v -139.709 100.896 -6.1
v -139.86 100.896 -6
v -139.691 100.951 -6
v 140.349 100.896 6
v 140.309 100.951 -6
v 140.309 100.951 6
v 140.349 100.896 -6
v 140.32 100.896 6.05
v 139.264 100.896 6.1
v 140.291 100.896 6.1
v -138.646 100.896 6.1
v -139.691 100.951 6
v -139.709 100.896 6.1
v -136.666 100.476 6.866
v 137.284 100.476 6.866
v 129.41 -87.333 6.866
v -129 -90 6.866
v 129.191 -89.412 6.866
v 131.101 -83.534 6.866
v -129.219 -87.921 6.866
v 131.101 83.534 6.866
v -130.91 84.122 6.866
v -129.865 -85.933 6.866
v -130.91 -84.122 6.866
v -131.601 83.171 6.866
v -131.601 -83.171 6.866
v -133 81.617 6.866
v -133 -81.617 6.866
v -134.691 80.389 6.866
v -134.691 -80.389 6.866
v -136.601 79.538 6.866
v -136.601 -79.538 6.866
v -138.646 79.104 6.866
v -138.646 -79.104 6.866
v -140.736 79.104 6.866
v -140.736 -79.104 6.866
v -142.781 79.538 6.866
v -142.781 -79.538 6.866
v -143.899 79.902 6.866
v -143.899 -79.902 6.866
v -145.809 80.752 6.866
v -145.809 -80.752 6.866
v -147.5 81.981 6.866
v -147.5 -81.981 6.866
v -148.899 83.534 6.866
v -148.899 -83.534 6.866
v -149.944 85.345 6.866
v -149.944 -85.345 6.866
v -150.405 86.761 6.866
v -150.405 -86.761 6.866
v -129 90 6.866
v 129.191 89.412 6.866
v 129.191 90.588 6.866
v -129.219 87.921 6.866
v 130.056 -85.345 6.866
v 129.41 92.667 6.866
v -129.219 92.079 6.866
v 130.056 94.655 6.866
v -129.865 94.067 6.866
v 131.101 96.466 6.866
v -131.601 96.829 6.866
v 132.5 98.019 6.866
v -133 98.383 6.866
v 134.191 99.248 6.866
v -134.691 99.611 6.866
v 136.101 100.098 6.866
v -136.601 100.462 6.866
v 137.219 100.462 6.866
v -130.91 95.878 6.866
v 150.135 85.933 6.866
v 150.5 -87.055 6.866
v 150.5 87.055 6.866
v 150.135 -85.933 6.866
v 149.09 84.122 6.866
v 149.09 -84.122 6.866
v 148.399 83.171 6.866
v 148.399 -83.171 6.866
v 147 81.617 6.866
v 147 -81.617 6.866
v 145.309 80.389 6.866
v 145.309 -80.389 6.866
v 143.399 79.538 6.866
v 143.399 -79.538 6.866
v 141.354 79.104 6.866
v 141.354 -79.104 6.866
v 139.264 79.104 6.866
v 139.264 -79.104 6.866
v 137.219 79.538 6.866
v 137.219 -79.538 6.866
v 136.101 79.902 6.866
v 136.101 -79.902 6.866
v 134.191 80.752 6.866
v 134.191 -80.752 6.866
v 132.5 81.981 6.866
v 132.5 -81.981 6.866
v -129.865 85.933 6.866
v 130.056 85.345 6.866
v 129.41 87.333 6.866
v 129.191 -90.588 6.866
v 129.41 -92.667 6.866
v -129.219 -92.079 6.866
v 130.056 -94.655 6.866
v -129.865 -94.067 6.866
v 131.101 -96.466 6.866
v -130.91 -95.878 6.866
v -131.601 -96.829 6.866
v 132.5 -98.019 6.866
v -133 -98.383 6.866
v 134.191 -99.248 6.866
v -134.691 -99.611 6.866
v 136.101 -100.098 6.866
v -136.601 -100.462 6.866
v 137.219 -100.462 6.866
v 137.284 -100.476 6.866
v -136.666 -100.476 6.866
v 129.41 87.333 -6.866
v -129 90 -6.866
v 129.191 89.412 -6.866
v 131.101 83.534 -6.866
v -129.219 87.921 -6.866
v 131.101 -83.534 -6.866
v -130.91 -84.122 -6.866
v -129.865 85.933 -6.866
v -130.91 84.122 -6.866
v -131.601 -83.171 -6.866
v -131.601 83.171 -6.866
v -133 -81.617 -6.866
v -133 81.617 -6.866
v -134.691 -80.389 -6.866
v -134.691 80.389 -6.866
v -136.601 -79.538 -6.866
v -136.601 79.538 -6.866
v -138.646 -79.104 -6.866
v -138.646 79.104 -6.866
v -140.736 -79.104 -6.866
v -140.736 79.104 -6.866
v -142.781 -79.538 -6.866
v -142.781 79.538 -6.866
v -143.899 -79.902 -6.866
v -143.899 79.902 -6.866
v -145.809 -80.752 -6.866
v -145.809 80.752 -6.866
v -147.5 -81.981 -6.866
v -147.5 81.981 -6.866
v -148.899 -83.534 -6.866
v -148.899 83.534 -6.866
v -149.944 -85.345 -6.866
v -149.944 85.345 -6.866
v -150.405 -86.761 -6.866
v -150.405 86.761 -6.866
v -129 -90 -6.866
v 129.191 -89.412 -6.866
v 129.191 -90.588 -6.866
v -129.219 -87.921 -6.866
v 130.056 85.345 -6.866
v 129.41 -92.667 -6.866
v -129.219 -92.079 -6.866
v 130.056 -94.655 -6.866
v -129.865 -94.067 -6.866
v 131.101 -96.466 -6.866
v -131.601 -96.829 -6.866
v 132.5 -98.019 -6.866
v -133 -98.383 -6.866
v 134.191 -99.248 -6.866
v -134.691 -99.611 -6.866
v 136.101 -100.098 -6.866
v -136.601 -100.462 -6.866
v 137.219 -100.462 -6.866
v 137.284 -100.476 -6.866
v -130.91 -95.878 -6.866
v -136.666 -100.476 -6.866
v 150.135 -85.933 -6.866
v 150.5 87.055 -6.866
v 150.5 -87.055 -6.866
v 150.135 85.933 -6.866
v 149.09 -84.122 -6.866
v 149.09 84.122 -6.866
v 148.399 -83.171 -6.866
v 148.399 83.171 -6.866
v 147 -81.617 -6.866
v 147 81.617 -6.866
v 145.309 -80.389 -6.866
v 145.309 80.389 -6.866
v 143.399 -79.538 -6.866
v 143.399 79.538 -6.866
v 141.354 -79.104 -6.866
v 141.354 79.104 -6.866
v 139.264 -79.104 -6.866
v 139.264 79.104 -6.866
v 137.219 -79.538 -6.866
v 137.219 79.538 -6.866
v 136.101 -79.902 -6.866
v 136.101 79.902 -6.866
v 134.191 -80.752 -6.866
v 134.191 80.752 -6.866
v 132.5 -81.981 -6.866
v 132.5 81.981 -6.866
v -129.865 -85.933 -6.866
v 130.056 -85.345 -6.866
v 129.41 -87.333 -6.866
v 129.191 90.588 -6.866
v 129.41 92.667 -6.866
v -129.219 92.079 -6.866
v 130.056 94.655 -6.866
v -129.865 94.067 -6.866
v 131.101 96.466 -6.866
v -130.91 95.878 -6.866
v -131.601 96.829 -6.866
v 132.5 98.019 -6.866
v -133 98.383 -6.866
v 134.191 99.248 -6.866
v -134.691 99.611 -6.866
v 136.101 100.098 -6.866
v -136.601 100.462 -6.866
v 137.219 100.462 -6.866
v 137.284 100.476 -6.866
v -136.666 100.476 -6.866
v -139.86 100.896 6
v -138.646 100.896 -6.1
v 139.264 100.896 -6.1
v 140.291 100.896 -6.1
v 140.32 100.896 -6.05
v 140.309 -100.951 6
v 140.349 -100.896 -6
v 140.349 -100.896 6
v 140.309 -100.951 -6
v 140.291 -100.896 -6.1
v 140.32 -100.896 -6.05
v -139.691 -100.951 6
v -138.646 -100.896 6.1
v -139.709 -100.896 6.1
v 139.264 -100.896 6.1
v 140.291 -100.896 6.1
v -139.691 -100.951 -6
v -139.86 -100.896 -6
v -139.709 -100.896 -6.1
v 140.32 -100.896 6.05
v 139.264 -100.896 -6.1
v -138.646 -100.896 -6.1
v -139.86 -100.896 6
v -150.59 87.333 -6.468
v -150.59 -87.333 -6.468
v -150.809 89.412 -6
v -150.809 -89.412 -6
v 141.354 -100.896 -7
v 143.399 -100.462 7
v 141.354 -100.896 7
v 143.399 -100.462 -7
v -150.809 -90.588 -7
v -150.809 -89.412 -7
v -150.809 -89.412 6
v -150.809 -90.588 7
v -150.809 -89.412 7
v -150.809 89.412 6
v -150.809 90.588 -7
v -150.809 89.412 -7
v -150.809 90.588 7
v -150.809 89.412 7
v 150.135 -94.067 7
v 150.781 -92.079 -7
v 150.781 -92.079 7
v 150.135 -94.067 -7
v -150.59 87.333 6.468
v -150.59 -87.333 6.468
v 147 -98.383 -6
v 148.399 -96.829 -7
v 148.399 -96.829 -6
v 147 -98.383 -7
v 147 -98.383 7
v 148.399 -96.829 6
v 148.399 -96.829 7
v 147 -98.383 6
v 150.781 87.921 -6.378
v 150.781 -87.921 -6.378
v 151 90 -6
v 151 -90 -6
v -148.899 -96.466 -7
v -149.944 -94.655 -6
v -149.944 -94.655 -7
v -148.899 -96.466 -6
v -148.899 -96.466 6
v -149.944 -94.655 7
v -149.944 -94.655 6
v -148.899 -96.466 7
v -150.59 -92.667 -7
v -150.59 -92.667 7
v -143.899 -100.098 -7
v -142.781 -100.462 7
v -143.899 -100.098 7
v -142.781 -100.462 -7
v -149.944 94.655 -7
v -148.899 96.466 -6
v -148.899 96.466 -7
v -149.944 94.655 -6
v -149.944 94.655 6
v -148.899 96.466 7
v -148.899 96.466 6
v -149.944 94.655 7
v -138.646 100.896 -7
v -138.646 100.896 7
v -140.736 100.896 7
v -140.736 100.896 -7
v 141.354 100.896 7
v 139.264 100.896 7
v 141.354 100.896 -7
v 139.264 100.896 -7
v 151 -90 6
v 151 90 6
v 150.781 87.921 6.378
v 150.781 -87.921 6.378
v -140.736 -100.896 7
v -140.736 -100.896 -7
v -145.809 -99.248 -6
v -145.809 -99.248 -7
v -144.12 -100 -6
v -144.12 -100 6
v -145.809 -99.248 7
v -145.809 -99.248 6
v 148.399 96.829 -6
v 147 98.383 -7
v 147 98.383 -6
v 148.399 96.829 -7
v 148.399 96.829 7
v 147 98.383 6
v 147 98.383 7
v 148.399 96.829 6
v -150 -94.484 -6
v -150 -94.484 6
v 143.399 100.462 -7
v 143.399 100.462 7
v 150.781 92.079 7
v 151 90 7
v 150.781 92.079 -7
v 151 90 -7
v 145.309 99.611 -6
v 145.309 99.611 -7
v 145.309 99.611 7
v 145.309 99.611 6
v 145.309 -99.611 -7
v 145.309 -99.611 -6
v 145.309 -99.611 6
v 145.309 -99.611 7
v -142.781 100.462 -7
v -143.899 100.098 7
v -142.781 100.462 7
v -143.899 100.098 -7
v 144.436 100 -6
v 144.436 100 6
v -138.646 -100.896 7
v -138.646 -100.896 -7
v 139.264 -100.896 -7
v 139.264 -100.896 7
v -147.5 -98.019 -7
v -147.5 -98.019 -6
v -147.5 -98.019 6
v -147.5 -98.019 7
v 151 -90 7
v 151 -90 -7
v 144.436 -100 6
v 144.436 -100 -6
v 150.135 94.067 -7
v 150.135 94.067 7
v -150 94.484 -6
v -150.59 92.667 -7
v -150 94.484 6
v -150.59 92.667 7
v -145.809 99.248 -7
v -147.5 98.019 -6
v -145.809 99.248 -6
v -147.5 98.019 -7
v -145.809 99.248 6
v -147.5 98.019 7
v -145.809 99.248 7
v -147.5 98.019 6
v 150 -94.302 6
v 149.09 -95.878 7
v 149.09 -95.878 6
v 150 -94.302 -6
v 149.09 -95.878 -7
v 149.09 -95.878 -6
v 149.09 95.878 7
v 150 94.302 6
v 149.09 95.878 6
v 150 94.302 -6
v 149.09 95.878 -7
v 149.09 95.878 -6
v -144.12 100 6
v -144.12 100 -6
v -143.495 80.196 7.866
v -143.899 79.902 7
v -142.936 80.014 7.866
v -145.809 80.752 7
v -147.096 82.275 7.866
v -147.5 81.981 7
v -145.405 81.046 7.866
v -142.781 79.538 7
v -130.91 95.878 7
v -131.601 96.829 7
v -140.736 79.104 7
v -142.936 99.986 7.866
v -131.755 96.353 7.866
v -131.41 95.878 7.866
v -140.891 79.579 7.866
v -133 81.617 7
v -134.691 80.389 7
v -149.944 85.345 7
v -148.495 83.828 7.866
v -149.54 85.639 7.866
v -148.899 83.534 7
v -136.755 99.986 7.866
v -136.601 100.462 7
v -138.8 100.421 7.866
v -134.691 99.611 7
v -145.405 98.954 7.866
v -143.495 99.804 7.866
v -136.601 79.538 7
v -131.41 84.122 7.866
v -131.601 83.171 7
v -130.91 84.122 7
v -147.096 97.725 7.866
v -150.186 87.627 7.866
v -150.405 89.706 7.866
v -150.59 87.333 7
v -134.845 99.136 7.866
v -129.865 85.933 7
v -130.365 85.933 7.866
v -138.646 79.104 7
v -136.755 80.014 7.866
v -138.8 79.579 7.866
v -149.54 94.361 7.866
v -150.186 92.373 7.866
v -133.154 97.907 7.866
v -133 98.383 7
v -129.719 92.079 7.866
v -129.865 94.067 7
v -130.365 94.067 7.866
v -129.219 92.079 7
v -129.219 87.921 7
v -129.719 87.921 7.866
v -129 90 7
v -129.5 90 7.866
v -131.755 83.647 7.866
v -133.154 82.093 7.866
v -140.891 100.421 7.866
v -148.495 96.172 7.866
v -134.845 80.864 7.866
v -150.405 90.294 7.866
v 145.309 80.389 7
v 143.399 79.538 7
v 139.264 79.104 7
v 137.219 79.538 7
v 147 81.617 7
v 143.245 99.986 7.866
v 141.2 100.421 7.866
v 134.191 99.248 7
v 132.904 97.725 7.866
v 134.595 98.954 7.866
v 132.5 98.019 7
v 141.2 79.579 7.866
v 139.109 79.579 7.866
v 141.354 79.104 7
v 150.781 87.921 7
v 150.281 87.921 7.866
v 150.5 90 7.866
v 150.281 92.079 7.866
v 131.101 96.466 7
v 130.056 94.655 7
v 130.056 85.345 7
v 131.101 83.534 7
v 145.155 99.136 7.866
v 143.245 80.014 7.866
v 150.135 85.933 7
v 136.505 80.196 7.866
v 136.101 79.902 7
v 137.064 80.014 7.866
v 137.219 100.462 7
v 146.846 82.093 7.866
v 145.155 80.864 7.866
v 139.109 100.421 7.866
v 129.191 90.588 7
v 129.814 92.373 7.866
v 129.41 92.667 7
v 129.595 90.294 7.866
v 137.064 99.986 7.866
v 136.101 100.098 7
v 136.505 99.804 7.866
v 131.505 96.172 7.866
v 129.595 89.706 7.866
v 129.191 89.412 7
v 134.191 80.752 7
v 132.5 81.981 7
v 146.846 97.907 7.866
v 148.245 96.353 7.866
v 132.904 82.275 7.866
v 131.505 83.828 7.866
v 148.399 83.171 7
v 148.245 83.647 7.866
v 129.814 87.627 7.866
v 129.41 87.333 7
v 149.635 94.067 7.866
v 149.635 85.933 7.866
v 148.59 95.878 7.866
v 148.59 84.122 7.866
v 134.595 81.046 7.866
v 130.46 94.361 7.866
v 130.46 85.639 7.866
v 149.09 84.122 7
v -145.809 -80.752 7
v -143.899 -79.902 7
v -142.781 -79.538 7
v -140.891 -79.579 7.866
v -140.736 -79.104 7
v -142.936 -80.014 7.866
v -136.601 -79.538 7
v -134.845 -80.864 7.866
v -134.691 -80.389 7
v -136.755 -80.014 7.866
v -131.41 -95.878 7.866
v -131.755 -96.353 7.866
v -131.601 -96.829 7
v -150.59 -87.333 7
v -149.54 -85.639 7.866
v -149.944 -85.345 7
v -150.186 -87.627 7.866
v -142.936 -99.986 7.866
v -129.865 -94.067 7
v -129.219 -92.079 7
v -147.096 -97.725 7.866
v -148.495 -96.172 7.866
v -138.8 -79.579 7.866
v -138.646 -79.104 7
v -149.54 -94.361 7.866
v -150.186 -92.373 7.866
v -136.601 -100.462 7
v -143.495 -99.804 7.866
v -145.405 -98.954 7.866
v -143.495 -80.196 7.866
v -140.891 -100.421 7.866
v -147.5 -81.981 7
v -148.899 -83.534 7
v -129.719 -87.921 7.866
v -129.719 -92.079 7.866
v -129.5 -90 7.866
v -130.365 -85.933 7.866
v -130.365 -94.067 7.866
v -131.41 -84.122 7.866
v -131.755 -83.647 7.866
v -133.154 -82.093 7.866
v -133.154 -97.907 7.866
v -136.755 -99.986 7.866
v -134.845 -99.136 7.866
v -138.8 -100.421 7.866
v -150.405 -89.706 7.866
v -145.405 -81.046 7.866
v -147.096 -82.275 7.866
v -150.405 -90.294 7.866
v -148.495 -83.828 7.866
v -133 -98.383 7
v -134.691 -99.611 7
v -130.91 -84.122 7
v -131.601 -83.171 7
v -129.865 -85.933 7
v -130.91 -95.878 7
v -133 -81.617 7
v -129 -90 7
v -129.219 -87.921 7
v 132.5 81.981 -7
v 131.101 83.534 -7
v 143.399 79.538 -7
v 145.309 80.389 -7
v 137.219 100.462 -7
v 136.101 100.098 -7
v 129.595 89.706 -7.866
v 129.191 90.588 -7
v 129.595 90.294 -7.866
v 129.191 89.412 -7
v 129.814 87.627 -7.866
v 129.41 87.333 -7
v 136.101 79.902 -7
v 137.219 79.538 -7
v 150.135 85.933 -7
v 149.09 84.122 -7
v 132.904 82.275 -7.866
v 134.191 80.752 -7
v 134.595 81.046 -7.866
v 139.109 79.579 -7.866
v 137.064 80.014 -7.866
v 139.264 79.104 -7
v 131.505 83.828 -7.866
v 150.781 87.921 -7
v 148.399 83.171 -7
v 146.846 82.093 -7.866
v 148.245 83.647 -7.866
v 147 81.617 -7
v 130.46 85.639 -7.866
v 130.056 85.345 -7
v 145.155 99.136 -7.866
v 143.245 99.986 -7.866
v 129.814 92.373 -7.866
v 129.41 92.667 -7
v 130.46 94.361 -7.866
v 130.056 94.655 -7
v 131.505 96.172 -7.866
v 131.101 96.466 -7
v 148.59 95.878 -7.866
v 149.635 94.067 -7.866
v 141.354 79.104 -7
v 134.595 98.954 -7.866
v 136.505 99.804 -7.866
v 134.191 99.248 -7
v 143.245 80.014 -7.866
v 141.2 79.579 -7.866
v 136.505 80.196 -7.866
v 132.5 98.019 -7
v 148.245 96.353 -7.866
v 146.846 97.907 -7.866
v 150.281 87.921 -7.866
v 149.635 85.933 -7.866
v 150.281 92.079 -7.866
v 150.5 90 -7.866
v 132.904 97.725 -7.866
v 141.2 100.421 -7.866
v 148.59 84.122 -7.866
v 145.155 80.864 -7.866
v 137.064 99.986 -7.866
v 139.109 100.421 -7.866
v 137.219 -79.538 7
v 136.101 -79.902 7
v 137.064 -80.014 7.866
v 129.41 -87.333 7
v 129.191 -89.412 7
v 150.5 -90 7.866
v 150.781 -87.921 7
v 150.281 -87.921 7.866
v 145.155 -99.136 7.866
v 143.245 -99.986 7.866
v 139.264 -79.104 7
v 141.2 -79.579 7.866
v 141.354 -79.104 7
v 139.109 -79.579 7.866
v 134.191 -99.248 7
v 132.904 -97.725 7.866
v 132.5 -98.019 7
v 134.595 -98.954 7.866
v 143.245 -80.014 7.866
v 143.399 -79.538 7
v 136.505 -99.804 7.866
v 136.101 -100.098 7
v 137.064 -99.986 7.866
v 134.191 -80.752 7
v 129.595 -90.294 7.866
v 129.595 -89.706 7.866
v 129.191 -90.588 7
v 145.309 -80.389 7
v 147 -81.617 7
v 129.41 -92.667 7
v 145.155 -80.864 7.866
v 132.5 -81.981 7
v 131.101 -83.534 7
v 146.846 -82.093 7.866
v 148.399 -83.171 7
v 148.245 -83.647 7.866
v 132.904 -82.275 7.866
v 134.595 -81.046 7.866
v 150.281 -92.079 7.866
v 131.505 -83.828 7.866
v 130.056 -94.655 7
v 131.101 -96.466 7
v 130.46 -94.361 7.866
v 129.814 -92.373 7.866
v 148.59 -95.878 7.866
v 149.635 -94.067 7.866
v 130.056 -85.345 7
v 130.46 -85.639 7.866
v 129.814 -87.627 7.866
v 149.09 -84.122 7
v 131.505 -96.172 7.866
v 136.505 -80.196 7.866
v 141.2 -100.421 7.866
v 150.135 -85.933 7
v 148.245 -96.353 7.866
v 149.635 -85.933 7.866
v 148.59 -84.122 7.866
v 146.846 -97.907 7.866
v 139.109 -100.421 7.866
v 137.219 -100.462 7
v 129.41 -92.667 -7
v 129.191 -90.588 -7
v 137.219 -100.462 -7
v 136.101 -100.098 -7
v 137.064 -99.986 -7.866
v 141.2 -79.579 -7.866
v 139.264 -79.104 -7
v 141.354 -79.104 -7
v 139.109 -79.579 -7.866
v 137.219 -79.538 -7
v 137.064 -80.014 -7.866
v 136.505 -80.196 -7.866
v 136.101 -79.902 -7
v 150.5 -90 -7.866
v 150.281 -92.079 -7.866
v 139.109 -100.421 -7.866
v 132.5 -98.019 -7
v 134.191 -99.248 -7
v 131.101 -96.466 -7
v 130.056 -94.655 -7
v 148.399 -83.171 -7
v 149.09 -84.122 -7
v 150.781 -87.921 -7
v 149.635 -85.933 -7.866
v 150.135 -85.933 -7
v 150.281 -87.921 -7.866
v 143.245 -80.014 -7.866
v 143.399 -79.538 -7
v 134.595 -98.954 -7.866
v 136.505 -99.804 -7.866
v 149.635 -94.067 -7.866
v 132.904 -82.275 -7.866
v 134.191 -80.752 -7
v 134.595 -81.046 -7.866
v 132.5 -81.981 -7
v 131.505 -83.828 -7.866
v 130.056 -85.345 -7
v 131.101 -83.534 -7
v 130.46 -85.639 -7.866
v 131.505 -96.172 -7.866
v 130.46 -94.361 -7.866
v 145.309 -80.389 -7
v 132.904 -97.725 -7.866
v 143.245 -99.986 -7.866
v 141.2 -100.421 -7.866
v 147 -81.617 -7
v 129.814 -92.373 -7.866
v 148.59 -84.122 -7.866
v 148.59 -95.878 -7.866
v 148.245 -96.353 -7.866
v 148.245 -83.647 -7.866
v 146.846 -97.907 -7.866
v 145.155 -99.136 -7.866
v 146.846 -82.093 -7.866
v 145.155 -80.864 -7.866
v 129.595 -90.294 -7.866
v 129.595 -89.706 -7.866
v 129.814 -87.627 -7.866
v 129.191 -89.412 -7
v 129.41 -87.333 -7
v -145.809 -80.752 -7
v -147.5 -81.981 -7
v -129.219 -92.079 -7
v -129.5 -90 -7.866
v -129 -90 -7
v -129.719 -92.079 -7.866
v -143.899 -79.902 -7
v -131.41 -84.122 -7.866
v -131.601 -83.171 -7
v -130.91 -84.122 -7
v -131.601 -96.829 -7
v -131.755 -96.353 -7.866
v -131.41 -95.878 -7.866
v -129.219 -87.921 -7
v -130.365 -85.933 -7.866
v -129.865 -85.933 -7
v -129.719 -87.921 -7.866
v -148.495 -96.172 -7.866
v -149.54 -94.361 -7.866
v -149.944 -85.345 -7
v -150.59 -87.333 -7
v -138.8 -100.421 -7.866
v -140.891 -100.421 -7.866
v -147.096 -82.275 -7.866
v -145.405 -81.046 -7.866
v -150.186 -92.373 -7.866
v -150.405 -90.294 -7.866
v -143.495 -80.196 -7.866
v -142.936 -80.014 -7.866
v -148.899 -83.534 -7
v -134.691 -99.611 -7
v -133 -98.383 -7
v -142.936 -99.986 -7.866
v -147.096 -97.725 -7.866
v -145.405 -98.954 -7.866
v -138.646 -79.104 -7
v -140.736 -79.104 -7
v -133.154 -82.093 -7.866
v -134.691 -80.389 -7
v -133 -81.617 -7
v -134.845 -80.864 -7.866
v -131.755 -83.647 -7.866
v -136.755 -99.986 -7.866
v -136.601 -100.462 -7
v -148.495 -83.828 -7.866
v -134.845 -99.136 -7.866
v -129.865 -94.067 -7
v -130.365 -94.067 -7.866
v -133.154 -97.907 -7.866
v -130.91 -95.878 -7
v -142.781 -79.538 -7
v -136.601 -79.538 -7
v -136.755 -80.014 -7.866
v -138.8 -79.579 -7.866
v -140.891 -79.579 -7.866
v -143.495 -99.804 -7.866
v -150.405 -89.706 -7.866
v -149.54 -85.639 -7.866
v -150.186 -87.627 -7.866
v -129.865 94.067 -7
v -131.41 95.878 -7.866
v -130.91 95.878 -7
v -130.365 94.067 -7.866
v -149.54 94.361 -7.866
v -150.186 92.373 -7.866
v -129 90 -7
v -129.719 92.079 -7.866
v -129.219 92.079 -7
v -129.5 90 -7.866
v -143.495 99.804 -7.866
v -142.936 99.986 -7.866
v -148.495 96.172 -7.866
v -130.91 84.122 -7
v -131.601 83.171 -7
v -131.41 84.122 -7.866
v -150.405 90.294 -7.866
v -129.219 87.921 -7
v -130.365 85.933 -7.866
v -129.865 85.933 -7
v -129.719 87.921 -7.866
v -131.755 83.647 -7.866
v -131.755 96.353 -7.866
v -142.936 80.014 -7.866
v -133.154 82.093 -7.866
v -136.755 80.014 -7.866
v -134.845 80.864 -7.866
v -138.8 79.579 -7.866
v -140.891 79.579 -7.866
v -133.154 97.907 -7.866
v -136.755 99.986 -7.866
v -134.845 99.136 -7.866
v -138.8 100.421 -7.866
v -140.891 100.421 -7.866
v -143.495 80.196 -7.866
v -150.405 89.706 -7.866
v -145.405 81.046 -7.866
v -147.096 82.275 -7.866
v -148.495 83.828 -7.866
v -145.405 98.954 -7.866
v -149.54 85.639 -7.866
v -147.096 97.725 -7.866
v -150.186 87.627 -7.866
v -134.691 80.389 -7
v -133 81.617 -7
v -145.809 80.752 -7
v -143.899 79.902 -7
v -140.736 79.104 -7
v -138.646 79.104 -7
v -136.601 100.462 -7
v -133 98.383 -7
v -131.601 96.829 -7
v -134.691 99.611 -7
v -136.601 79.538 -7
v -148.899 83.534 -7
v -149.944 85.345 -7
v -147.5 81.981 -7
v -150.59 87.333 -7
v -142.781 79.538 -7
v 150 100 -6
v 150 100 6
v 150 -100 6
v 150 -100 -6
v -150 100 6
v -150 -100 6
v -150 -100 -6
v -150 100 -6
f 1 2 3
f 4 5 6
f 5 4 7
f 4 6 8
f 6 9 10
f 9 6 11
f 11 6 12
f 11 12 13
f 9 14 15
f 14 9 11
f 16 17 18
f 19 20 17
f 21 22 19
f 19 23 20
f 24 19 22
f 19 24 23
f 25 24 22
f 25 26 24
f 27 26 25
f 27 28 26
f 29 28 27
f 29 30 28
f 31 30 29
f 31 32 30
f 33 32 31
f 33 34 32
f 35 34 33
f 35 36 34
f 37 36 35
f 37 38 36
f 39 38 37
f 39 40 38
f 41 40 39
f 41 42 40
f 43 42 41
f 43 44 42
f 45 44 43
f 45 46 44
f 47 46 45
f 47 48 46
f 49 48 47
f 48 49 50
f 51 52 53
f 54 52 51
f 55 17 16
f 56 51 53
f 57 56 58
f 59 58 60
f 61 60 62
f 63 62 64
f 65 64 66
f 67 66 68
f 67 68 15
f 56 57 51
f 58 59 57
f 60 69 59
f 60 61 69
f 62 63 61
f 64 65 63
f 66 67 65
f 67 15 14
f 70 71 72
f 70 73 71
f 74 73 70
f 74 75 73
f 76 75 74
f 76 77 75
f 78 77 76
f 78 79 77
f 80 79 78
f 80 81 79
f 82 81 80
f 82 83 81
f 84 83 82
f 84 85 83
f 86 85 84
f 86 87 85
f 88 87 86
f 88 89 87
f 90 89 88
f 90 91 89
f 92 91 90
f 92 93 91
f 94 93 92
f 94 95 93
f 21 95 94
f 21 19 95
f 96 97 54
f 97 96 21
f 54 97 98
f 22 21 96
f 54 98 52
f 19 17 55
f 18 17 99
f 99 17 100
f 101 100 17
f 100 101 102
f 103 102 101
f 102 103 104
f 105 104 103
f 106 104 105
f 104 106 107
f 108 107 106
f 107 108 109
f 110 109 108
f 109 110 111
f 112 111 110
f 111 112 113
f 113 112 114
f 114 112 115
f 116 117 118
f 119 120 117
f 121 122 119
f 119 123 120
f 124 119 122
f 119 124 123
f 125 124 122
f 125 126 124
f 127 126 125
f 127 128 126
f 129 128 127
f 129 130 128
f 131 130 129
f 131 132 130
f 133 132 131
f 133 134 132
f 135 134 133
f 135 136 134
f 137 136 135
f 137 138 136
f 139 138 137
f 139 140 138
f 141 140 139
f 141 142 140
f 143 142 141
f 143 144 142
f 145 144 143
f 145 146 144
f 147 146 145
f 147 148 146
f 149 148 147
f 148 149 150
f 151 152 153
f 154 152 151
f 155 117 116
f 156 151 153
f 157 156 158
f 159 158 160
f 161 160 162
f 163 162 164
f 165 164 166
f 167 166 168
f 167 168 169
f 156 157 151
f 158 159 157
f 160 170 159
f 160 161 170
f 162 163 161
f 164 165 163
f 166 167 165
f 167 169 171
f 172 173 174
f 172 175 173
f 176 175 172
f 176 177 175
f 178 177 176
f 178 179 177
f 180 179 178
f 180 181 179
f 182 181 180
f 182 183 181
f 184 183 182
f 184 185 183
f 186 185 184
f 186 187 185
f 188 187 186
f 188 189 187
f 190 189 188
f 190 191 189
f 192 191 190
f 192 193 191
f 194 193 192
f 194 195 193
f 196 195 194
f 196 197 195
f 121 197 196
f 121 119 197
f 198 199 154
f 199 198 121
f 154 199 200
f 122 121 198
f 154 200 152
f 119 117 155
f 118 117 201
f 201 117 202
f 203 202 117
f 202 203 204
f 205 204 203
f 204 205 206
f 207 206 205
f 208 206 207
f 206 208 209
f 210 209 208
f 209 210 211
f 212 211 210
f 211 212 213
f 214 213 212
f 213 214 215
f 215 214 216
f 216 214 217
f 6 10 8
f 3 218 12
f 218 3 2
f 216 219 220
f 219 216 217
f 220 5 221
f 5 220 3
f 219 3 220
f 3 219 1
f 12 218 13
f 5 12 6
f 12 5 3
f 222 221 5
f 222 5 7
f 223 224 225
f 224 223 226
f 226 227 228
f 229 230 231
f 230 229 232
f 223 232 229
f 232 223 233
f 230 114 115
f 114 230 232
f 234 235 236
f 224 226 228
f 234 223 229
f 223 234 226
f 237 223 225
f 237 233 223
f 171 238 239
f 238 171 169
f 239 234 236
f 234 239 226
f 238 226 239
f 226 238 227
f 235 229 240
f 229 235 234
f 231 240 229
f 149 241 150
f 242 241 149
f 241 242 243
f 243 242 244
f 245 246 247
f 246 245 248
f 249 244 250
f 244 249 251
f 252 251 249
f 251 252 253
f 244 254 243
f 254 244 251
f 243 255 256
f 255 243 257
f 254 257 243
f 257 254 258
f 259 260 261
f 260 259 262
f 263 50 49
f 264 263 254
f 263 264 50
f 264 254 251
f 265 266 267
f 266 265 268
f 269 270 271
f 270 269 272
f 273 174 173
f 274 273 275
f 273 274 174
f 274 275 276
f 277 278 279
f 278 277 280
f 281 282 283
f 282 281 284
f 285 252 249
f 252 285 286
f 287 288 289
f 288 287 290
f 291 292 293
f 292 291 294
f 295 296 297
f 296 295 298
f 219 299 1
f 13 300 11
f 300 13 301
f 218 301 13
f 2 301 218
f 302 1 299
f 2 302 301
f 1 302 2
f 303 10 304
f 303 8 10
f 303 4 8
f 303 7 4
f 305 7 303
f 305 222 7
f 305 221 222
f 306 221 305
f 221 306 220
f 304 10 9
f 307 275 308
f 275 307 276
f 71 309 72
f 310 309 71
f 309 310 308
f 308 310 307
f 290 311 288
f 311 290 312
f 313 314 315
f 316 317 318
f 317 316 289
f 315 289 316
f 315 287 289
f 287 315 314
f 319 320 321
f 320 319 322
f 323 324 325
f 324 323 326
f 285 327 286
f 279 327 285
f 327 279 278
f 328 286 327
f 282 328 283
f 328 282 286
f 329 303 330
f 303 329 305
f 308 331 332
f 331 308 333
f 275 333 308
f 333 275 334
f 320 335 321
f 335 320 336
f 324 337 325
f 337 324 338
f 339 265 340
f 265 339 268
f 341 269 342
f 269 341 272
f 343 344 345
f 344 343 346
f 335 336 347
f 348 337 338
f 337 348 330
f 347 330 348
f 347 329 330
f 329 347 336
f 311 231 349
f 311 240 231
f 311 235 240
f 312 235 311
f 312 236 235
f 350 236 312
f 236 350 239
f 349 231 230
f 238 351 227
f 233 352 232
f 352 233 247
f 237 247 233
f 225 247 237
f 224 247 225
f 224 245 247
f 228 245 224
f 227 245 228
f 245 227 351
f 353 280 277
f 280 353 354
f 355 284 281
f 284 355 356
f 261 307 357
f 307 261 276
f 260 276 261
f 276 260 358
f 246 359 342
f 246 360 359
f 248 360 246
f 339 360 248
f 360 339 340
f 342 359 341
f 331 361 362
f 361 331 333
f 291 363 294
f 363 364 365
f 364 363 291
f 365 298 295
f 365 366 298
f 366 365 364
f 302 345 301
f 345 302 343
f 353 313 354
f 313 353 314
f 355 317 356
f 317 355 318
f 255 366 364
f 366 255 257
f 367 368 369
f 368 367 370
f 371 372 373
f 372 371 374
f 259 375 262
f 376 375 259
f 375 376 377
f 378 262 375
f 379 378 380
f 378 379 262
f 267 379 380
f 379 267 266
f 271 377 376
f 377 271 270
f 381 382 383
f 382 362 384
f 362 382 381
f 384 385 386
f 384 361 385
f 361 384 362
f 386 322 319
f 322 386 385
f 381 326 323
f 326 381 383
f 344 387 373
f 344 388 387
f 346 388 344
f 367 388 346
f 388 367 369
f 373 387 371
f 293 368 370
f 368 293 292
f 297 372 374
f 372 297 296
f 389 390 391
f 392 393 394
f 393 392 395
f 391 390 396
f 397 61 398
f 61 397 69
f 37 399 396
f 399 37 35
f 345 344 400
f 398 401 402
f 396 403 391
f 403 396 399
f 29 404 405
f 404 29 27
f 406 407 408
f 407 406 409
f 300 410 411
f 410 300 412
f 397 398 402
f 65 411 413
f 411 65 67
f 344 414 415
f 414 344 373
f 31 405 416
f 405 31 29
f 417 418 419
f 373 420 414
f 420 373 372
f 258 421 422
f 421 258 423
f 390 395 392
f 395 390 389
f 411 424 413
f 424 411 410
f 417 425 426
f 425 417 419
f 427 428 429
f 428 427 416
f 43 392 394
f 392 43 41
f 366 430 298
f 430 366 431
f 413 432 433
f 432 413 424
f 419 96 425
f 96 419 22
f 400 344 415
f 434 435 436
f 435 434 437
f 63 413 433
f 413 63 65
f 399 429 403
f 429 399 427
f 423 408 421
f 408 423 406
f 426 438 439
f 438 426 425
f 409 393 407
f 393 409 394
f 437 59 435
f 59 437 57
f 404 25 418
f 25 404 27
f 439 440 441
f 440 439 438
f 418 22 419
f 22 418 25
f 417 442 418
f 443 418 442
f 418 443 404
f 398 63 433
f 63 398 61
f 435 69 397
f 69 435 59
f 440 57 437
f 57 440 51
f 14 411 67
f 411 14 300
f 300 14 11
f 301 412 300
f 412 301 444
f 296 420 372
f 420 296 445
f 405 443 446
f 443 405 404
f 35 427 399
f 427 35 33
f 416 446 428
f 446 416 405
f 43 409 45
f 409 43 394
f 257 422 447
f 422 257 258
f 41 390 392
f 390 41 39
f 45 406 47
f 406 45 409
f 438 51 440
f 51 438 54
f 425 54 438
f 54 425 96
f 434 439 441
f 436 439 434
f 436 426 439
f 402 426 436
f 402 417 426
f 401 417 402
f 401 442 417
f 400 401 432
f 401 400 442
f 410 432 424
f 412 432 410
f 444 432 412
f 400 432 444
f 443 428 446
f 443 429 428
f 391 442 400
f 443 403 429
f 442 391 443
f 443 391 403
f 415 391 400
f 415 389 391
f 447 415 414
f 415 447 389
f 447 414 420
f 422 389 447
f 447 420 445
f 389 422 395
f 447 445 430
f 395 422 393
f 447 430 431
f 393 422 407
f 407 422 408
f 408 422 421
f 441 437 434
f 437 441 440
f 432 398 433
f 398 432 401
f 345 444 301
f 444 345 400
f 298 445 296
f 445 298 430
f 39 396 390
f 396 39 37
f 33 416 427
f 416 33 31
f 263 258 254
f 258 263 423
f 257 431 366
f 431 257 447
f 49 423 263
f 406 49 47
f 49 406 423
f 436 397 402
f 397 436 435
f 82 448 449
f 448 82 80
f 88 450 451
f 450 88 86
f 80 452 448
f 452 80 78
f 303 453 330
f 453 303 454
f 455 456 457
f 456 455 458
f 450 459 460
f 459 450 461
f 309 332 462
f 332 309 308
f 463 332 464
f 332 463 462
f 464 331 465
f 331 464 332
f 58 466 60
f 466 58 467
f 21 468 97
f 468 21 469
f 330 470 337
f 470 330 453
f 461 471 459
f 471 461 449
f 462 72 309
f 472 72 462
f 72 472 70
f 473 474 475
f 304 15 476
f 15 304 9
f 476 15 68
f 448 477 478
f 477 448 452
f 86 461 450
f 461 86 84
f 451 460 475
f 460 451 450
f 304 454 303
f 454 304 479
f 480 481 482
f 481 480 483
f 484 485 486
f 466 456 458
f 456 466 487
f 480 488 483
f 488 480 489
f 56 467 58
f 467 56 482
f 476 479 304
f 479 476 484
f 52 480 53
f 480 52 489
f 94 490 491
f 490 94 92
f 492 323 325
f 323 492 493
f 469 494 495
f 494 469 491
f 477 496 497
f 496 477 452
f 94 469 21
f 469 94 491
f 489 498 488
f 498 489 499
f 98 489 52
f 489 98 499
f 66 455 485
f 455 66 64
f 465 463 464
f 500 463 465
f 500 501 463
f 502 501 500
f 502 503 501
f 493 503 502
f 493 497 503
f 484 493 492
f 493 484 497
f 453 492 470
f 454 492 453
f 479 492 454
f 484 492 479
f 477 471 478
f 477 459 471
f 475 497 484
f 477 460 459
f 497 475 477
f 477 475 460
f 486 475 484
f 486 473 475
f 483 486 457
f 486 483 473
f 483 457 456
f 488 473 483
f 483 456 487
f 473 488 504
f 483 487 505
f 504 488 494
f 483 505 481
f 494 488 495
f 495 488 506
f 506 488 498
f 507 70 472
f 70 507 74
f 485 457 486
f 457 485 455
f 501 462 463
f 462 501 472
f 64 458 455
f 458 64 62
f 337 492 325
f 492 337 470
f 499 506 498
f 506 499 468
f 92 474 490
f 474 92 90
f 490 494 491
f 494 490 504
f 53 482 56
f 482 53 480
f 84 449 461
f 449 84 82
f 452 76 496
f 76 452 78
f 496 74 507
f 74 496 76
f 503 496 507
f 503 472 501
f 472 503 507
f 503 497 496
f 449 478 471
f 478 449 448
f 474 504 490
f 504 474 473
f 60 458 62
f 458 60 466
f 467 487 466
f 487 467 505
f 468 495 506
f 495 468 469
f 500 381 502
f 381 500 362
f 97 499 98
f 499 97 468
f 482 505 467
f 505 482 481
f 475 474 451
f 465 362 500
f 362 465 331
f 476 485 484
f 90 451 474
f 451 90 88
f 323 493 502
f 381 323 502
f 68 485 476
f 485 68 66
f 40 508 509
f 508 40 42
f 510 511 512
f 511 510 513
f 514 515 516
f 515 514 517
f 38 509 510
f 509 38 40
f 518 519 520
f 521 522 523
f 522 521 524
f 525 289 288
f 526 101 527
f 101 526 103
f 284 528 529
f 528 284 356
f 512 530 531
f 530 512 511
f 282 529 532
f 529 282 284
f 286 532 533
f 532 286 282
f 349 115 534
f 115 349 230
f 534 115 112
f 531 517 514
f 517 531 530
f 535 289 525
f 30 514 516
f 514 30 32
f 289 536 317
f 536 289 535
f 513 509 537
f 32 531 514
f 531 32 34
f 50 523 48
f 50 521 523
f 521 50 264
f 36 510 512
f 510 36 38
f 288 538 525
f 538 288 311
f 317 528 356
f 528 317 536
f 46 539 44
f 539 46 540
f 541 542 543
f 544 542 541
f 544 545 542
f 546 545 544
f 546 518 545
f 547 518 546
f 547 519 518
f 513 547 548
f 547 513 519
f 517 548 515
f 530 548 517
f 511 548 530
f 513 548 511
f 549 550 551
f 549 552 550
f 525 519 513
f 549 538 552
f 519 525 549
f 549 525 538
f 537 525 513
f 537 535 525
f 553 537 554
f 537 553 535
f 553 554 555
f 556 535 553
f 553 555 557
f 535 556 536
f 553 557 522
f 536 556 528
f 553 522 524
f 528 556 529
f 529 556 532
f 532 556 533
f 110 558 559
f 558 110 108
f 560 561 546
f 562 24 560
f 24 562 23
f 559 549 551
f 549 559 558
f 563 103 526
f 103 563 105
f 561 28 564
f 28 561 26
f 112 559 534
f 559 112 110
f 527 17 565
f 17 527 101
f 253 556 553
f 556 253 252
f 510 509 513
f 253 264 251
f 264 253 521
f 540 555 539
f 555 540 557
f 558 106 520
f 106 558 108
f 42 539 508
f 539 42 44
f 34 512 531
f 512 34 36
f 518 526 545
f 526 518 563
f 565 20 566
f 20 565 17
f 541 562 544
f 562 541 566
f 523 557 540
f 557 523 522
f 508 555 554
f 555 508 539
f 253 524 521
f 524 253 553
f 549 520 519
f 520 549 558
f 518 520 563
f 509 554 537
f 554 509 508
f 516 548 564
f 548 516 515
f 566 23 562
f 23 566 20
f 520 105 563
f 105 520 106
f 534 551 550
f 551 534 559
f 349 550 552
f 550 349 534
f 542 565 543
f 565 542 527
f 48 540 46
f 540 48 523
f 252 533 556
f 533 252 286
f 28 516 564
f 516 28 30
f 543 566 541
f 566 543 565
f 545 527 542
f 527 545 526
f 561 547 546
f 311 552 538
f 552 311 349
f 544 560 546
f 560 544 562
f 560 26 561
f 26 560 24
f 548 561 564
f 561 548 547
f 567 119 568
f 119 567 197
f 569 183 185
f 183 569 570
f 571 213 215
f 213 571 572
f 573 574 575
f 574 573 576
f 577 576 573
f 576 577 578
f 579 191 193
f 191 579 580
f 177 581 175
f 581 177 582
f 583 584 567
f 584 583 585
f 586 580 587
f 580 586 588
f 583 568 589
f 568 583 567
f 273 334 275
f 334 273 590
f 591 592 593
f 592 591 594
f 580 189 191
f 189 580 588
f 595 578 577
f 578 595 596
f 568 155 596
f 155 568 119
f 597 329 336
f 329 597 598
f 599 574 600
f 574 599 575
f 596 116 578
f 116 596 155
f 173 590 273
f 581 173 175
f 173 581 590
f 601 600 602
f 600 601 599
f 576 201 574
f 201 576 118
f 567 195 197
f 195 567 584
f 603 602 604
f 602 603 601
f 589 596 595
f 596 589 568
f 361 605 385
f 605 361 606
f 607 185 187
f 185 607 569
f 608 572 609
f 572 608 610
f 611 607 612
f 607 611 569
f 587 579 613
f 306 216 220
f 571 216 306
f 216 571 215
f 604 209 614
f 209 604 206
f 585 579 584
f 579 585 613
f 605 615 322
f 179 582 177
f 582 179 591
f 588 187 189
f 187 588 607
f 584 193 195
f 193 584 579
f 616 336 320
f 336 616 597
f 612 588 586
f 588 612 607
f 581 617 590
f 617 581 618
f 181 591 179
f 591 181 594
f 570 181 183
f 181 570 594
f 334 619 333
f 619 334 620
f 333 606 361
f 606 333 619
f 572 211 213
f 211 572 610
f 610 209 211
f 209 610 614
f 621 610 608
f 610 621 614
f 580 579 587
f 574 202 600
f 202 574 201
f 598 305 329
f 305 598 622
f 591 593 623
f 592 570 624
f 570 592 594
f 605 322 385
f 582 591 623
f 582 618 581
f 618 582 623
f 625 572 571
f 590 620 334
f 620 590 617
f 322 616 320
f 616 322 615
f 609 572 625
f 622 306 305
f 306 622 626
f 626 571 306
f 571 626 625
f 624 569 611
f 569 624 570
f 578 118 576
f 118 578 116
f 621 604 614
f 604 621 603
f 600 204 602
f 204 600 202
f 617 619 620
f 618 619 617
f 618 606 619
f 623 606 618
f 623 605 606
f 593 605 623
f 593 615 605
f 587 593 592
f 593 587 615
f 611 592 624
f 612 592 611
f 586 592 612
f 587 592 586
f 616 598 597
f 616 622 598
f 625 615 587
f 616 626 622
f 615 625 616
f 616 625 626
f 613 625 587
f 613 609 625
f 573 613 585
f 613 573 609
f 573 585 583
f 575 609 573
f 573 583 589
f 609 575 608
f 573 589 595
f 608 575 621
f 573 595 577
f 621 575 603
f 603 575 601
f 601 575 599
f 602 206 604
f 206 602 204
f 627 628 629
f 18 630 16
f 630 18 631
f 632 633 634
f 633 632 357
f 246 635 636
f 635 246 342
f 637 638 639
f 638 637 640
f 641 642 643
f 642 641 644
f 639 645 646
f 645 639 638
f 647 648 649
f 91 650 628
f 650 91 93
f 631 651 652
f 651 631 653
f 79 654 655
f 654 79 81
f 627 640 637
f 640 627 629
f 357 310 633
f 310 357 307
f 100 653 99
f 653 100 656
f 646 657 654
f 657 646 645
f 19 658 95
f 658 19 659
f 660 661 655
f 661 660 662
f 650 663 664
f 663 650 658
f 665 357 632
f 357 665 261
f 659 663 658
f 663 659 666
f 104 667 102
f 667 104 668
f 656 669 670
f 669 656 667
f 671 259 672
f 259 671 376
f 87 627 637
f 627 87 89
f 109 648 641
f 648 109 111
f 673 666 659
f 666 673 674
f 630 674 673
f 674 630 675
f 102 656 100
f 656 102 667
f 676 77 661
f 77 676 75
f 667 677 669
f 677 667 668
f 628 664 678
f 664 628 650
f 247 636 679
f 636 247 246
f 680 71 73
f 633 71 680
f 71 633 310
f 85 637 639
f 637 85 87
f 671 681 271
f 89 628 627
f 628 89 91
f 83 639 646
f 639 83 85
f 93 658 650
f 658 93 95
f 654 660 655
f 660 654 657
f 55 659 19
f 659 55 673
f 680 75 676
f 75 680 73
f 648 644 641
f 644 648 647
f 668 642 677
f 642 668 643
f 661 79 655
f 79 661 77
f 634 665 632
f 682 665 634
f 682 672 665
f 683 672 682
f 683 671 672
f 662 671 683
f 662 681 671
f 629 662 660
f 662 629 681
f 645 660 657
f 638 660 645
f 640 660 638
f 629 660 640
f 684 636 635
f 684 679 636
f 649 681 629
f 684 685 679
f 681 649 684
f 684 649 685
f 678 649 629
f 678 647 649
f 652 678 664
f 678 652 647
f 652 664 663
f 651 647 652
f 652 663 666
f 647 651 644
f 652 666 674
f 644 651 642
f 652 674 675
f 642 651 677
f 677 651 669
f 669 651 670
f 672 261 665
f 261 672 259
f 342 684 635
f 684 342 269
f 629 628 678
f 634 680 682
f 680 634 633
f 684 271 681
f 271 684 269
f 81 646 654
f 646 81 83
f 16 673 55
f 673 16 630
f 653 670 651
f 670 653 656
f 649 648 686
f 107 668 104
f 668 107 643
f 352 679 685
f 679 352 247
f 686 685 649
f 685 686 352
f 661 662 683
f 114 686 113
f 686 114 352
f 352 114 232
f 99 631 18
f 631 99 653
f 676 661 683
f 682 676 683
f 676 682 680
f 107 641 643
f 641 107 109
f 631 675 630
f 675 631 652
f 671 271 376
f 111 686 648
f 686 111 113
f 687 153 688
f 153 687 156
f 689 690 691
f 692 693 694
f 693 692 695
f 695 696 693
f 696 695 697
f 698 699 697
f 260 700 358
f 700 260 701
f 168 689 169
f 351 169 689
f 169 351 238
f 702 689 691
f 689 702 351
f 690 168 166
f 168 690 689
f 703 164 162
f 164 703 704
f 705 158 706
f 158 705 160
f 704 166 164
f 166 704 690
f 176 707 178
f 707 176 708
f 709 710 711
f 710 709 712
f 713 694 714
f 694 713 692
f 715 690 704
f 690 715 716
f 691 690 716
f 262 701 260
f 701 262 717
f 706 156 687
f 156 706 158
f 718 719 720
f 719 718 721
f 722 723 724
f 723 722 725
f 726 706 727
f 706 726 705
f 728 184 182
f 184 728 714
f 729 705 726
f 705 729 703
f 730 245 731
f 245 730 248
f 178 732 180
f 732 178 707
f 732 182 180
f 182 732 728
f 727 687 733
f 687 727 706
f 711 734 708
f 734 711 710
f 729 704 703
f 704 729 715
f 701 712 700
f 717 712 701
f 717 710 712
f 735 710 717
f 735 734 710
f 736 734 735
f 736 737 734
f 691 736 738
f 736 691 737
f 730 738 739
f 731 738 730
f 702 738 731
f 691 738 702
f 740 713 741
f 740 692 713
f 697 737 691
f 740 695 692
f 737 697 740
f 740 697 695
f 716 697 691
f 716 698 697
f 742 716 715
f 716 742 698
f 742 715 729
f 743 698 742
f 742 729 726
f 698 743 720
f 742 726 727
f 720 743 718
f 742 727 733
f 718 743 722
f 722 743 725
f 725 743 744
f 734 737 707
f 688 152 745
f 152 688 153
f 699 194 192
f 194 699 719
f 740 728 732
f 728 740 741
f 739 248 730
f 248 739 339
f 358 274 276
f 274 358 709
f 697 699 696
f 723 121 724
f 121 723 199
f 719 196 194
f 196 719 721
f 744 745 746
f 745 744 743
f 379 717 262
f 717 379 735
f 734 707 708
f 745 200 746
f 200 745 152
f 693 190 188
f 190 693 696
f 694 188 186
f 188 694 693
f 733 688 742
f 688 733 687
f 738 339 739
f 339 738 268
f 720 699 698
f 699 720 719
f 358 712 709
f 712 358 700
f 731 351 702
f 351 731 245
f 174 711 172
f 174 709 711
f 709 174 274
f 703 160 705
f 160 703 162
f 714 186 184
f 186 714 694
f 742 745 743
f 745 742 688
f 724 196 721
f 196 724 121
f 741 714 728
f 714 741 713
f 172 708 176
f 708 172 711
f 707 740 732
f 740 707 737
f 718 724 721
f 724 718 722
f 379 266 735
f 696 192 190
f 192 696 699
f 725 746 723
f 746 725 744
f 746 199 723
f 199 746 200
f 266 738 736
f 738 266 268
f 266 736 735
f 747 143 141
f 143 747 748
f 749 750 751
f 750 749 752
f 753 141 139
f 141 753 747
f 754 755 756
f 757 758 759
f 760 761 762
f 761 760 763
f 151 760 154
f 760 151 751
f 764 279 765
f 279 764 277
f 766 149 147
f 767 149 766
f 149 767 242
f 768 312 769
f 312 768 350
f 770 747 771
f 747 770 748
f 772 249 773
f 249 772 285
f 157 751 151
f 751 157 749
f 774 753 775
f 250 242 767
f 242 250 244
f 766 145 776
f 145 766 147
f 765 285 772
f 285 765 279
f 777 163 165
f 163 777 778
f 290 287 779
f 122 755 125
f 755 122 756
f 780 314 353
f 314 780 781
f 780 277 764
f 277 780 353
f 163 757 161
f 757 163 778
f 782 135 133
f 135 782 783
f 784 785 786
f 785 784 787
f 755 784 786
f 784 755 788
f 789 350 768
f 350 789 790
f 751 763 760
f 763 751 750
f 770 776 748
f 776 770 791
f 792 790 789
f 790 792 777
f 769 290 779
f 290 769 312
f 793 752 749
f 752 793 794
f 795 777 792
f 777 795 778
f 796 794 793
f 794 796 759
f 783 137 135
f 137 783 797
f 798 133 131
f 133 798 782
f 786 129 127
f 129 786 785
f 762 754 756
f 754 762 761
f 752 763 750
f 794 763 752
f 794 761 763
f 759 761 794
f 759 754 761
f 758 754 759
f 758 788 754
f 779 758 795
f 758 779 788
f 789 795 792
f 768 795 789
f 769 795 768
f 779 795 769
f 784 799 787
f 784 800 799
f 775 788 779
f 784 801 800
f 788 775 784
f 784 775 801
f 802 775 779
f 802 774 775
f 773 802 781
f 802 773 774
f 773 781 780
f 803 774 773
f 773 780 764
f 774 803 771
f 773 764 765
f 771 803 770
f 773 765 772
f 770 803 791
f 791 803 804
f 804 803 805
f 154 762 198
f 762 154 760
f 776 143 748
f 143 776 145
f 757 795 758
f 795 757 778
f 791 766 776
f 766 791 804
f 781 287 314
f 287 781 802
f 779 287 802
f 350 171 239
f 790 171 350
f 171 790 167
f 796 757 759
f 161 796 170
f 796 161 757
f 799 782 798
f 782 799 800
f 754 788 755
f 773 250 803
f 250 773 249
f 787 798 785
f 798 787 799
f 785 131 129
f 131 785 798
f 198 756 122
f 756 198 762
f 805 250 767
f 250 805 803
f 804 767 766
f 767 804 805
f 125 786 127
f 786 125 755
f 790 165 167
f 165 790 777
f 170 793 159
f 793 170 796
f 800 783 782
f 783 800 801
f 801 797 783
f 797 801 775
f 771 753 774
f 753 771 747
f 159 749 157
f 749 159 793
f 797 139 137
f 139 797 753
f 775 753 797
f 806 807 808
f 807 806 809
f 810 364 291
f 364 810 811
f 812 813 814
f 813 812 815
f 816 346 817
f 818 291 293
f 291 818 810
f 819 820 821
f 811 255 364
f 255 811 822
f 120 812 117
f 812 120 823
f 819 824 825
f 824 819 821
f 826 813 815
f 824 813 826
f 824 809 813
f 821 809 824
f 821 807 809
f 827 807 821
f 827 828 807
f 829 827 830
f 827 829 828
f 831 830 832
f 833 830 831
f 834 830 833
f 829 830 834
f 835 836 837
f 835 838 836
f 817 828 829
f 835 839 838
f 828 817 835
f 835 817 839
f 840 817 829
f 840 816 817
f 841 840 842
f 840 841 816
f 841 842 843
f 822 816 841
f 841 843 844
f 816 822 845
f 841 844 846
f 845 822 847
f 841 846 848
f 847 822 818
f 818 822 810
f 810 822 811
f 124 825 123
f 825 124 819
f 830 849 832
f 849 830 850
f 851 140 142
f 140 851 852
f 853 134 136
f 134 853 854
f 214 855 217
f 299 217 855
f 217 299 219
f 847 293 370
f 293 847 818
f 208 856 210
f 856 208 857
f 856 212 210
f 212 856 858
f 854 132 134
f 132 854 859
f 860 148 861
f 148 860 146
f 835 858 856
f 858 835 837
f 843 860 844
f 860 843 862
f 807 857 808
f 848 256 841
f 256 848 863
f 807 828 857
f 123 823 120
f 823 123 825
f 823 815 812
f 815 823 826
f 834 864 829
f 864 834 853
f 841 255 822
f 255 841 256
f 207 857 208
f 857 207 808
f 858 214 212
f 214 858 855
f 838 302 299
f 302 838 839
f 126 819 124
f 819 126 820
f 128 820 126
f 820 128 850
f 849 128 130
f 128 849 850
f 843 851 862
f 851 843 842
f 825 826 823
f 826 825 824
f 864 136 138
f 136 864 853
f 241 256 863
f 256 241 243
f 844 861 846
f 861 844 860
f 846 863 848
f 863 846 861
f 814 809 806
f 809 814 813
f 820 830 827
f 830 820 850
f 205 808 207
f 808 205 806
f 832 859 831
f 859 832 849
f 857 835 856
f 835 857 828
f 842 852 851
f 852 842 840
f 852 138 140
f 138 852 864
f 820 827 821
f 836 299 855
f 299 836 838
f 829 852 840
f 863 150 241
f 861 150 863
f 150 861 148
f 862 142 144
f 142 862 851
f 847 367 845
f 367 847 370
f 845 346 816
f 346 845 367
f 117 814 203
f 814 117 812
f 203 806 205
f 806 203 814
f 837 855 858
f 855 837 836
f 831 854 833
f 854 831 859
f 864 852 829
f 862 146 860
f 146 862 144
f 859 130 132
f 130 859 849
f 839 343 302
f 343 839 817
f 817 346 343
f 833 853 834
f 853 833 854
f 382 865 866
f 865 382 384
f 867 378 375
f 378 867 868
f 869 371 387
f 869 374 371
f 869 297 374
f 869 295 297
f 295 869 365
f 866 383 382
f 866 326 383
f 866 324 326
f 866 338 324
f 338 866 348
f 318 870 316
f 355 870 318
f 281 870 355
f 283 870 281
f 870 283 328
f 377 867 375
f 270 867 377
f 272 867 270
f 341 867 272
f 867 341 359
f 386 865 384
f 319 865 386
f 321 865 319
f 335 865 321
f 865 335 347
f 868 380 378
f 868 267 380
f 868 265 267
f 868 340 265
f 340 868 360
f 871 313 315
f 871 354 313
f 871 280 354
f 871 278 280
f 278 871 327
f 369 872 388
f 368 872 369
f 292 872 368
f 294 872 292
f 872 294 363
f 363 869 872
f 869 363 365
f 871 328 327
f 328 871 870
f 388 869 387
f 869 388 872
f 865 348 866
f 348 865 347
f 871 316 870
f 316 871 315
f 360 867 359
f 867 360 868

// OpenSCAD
// Parameters
plate_length = 300; //[150:600:1]
plate_width = 200; //[100:400:1]
plate_thickness = 12; //[6:24:1]
corner_radius = 10; //[5:20:1]
edge_fillet_radius = 1; //[0.5:3:0.5]
corner_chamfer = 2; //[1:6:0.5]
connect_overlap = 1; //[0.5:2:0.5]

// Base shapes
module tooling_plate_body() {
  color("Silver")
  cube([plate_length, plate_width, plate_thickness], center=true);
}

module rounded_corners() {
  color("Silver")
  union() {
    translate([plate_length/2 - corner_radius, plate_width/2 - corner_radius, 0])
      cylinder(r=corner_radius, h=plate_thickness + 2*connect_overlap, center=true);
    translate([-plate_length/2 + corner_radius, plate_width/2 - corner_radius, 0])
      cylinder(r=corner_radius, h=plate_thickness + 2*connect_overlap, center=true);
    translate([-plate_length/2 + corner_radius, -plate_width/2 + corner_radius, 0])
      cylinder(r=corner_radius, h=plate_thickness + 2*connect_overlap, center=true);
    translate([plate_length/2 - corner_radius, -plate_width/2 + corner_radius, 0])
      cylinder(r=corner_radius, h=plate_thickness + 2*connect_overlap, center=true);
  }
}

module rounded_corners_rect_x() {
  color("Silver")
  cube([plate_length - 2*corner_radius, plate_width, plate_thickness], center=true);
}

module rounded_corners_rect_y() {
  color("Silver")
  cube([plate_length, plate_width - 2*corner_radius, plate_thickness], center=true);
}

module edge_fillet_sphere() {
  sphere(r=edge_fillet_radius, center=true);
}

// Operations
module rounded_corners_union() {
  union() {
    rounded_corners_rect_x();
    rounded_corners_rect_y();
    rounded_corners();
  }
}

module edge_fillet() {
  minkowski() {
    rounded_corners_union();
    edge_fillet_sphere();
  }
}

module tooling_plate_complete() {
  union() {
    edge_fillet();
    tooling_plate_body();
  }
}

// Final output
tooling_plate_complete();
